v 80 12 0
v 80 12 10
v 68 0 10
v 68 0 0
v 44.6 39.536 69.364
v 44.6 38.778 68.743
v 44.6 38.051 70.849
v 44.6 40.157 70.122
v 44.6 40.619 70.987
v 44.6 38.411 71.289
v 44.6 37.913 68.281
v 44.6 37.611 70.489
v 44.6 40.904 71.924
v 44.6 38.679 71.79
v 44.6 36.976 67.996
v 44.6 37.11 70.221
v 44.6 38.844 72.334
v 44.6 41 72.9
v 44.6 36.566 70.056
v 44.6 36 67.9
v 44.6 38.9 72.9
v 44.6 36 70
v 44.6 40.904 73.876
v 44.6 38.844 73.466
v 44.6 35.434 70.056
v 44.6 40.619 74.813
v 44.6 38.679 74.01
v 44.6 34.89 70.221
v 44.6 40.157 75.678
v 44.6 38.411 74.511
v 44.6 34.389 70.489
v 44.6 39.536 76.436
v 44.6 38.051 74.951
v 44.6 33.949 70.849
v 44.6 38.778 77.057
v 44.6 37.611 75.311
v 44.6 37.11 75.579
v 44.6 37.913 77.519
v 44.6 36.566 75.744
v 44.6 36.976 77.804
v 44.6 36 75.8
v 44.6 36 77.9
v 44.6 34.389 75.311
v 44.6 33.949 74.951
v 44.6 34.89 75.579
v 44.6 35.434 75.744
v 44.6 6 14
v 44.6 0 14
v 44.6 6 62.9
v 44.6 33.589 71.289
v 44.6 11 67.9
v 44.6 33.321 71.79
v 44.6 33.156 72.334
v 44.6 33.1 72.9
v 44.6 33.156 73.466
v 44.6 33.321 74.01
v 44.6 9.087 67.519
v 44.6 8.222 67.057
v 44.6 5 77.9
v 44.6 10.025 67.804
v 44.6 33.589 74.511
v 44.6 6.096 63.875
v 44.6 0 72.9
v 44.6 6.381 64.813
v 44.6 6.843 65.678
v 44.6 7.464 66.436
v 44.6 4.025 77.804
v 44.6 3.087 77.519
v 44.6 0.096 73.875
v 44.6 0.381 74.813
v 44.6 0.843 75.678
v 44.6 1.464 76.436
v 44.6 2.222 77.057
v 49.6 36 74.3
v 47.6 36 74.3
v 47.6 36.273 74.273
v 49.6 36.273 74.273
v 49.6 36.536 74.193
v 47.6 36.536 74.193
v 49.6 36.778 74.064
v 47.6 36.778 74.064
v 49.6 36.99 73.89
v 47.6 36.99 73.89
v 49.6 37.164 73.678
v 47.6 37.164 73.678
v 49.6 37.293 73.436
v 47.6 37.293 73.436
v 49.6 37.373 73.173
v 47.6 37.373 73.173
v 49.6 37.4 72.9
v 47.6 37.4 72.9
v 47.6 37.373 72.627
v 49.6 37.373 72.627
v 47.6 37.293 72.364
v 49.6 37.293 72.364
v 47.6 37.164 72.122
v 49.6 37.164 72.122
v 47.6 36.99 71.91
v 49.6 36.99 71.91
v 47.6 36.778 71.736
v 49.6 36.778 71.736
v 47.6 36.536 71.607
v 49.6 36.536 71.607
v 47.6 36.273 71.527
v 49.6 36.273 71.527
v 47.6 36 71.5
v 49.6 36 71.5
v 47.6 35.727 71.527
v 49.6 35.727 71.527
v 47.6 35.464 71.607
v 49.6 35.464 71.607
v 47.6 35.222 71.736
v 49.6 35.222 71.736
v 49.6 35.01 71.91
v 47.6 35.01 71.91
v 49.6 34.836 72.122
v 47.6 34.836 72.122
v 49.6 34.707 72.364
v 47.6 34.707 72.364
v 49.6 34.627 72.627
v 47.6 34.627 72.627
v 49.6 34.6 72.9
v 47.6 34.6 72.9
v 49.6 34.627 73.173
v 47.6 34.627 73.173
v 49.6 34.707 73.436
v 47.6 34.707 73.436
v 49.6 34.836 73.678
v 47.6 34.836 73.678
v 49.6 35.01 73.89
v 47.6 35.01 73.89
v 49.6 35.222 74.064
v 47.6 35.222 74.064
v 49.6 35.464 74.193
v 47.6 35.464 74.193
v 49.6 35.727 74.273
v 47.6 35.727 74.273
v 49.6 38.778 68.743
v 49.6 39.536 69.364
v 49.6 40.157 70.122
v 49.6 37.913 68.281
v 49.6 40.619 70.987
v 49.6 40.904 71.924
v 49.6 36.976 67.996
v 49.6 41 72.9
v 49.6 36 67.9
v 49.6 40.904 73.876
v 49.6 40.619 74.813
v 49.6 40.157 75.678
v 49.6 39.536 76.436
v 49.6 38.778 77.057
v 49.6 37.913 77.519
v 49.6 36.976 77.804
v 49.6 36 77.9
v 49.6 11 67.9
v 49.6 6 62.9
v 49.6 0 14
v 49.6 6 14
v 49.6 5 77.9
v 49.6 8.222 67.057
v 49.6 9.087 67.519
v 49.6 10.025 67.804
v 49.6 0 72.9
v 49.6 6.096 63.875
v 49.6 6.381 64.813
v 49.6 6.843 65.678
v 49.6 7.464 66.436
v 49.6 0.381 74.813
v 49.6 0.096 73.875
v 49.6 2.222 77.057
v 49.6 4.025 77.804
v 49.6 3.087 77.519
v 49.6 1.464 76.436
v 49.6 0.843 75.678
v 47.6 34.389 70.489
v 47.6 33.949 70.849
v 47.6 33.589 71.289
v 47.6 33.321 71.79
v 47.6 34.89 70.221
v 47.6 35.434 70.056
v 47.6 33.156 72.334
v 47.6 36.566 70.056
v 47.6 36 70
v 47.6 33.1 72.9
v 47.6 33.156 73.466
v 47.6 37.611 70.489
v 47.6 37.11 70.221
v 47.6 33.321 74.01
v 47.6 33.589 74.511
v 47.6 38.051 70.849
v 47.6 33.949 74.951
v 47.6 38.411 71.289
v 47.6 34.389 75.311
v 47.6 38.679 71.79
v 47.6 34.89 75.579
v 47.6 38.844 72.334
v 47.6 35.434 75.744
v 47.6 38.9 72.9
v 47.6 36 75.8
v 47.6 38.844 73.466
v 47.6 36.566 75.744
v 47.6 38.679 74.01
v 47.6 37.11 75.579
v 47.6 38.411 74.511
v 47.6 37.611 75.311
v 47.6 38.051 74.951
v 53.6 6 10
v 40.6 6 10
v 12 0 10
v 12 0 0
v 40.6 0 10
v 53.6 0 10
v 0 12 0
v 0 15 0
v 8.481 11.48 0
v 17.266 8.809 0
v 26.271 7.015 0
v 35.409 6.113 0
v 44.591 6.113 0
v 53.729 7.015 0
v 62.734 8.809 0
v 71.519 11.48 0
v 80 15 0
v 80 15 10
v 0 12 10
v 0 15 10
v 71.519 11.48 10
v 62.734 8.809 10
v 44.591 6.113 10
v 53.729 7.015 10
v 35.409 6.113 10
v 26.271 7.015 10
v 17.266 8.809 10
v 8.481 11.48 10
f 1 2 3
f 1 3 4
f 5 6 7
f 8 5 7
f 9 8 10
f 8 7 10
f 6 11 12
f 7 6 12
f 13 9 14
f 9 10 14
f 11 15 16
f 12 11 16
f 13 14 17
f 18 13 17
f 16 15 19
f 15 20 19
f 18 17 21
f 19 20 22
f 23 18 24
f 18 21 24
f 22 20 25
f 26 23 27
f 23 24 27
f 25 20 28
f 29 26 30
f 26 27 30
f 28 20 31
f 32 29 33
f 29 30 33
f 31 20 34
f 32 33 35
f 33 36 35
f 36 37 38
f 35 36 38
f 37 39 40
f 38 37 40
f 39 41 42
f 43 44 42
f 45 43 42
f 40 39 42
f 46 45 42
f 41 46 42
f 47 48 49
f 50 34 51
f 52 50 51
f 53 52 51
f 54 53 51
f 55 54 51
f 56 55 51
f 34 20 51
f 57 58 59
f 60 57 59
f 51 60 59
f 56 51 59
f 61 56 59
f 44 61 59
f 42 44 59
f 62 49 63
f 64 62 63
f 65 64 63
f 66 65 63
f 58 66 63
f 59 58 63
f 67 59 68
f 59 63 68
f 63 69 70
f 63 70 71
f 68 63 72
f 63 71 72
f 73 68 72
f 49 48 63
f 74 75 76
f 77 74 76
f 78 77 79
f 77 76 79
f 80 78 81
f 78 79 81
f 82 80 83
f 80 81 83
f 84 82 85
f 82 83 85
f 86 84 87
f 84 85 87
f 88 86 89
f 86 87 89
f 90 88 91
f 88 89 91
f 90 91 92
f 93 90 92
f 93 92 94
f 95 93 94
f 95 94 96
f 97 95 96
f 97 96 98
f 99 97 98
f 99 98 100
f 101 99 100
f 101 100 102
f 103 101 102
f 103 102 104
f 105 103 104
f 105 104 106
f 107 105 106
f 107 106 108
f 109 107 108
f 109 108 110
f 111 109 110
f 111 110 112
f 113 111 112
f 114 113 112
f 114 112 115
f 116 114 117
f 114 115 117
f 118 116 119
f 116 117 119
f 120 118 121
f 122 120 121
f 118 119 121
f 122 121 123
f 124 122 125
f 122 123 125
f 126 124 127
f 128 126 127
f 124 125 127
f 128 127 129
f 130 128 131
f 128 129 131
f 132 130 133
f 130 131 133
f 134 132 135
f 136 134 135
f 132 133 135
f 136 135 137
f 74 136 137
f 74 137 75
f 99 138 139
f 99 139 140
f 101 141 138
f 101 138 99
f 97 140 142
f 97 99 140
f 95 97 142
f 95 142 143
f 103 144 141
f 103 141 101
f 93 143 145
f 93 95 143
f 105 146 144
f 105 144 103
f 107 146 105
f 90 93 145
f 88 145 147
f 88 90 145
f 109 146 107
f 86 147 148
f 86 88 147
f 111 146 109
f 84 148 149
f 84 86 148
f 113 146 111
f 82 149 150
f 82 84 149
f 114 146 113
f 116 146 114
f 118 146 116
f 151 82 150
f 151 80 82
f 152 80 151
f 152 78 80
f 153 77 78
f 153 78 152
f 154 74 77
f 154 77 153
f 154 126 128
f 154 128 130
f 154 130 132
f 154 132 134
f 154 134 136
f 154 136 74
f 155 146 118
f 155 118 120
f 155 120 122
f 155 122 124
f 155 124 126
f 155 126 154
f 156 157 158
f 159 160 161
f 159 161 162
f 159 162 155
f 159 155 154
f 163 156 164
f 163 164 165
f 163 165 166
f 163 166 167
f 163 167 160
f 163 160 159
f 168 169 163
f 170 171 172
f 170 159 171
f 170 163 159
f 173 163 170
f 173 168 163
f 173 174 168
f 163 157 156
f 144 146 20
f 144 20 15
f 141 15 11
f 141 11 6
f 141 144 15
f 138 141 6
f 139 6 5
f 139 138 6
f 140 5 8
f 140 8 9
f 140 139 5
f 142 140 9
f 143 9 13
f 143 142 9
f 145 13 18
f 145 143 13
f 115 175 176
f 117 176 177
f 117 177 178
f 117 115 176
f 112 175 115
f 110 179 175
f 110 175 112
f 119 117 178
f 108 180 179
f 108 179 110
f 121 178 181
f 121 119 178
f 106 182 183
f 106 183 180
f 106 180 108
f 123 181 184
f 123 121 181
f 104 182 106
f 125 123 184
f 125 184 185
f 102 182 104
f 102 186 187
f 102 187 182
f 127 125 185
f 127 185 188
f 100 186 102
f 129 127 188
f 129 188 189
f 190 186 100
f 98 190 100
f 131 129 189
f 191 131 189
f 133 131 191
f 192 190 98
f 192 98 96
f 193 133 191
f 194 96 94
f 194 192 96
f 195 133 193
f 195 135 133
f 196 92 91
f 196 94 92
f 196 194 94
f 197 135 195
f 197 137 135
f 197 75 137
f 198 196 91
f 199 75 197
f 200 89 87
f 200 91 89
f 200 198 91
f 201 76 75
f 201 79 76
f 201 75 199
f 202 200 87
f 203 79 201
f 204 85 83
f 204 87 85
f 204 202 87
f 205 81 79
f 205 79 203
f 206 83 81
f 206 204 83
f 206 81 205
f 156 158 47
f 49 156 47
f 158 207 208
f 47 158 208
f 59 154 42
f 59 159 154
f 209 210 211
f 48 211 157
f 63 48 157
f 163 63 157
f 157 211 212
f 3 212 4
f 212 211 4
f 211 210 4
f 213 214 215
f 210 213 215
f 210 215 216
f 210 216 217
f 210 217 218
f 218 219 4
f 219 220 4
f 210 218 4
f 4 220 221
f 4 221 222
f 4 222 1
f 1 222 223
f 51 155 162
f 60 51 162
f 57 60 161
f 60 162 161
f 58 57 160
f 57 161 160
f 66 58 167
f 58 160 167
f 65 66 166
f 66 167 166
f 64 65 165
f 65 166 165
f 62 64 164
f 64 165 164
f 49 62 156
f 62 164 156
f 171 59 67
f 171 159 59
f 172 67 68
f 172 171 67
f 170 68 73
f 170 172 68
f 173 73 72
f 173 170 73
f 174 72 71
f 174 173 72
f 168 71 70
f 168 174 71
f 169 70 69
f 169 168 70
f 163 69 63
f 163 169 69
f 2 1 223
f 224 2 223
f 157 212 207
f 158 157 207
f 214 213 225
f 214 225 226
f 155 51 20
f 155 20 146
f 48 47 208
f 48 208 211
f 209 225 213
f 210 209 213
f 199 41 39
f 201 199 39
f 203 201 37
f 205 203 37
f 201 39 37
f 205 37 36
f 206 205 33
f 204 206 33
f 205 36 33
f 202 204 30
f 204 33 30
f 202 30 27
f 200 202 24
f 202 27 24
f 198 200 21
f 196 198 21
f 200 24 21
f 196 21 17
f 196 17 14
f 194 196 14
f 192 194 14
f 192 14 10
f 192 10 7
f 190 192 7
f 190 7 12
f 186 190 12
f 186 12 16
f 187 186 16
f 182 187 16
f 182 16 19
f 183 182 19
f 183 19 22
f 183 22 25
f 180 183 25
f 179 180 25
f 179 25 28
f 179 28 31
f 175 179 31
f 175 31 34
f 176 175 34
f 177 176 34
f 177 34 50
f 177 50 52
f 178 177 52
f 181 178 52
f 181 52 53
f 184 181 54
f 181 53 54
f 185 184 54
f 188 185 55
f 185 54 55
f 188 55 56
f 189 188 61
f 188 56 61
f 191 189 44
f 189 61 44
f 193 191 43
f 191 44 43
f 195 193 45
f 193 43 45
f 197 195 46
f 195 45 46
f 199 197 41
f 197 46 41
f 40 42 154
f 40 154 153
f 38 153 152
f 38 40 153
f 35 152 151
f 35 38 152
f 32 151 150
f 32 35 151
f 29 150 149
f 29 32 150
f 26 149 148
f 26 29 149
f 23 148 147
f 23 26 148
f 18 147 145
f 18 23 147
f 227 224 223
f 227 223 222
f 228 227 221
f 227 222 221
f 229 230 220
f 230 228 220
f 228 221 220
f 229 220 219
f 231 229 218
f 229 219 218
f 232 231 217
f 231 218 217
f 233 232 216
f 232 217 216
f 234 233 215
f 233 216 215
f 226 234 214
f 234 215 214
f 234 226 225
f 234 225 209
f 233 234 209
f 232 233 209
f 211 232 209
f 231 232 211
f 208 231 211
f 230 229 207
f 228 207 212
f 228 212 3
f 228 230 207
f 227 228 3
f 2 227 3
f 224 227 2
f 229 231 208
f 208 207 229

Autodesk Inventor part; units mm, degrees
ref_plane "YZ Plane" through (0, 0, 0) normal (1, 0, 0) x (0, 1, 0)
ref_plane "XZ Plane" through (0, 0, 0) normal (0, 1, 0) x (-1, 0, 0)
ref_plane "XY Plane" through (0, 0, 0) normal (0, 0, 1) x (1, 0, 0)
sketch "Esquisse1" plane through (0, 0, 0) normal (0, 0, 1) x (1, 0, 0)
  line L0 (0, 0) -> (0, 15)
  line L1 (0, 0) -> (80, 0)
  line L2 (80, 0) -> (80, 15)
  arc A0 (0, 15) -> (80, 15) centre (40, 99.3889) ccw
  line L3 (0, 6) -> (80, 6) construction
  line L4 (40, 0) -> (40, 6) construction
  dimension "d0" = 15
  dimension "d1" = 80
  dimension "d28" = 6
extrude "Extrusion1" add sketch "Esquisse1" along normal blind 10
sketch "Esquisse2" plane through (0, 0, 10) normal (0, 0, 1) x (1, 0, 0)
  line L0 (0, 0) -> (80, 0) projected
  line L1 (44.6, 0) -> (49.6, 0)
  line L2 (49.6, 0) -> (49.6, 6)
  line L3 (49.6, 6) -> (44.6, 6)
  line L4 (44.6, 6) -> (44.6, 0)
  line L5 (0, 15) -> (0, 0) projected
  line L6 (0, 6) -> (80, 6) construction
  line L7 (80, 0) -> (80, 15) projected
  arc A0 (0, 15) -> (80, 15) centre (40, 99.3889) ccw projected
  line L8 (40, 0) -> (40, 6) construction
  dimension "d6" = 5
  dimension "d9" = 80
  dimension "d11" = 6
  dimension "d27" = 4.6
extrude "Extrusion2" add sketch "Esquisse2" along normal blind 67.9 contours L4 L3 L2 L0
sketch "Esquisse6" plane through (44.6, 6, 10) normal (0, 1, 0) x (1, 0, 0)
  line L0 (5, 0) -> (5, -67.9) projected
  line L1 (0, 0) -> (0, -67.9) projected
  line L2 (5, -67.9) -> (0, -67.9)
  line L3 (0, -67.9) -> (0, -57.9)
  line L4 (0, -57.9) -> (5, -57.9)
  line L5 (5, -57.9) -> (5, -67.9)
  point P0 (-44.6, 10)
  point P1 (5, -57.9)
  dimension "d29" = 10
extrude "Extrusion5" add sketch "Esquisse6" along normal blind 35
sketch "Esquisse7" plane through (44.6, 0, 10) normal (-1, 0, 0) x (0, 0, 1)
  line L0 (67.9, 41) -> (57.9, 41) construction
  line L1 (62.9, 41) -> (62.9, 0) construction
  line L2 (0, 0) -> (67.9, 0) construction
  circle A0 centre (62.9, 36) radius 2.9
  circle A1 centre (62.9, 36) radius 1.4
  point P0 (-10, 0)
  dimension "d38" = 2.8
  dimension "d53" = 5.8
  dimension "d54" = 5
extrude "Extrusion6" cut sketch "Esquisse7" against normal up to surface (5 mm away) contours A1
chamfer "Chanfrein1" distance 4 angle 45 2 edges at (44.6, 3, 10) (49.6, 3, 10)
fillet "Congé1" radius 5 2 edges at (47.1, 0, 77.9) (47.1, 6, 67.9)
fillet "Congé2" radius 5 2 edges at (47.1, 41, 77.9) (47.1, 41, 67.9)
chamfer "Chanfrein2" distance 12 angle 45 2 edges at (0, 0, 5) (80, 0, 5)
extrude "Extrusion8" cut sketch "Esquisse7" against normal blind 3
properties part number "_Impression 3D"
